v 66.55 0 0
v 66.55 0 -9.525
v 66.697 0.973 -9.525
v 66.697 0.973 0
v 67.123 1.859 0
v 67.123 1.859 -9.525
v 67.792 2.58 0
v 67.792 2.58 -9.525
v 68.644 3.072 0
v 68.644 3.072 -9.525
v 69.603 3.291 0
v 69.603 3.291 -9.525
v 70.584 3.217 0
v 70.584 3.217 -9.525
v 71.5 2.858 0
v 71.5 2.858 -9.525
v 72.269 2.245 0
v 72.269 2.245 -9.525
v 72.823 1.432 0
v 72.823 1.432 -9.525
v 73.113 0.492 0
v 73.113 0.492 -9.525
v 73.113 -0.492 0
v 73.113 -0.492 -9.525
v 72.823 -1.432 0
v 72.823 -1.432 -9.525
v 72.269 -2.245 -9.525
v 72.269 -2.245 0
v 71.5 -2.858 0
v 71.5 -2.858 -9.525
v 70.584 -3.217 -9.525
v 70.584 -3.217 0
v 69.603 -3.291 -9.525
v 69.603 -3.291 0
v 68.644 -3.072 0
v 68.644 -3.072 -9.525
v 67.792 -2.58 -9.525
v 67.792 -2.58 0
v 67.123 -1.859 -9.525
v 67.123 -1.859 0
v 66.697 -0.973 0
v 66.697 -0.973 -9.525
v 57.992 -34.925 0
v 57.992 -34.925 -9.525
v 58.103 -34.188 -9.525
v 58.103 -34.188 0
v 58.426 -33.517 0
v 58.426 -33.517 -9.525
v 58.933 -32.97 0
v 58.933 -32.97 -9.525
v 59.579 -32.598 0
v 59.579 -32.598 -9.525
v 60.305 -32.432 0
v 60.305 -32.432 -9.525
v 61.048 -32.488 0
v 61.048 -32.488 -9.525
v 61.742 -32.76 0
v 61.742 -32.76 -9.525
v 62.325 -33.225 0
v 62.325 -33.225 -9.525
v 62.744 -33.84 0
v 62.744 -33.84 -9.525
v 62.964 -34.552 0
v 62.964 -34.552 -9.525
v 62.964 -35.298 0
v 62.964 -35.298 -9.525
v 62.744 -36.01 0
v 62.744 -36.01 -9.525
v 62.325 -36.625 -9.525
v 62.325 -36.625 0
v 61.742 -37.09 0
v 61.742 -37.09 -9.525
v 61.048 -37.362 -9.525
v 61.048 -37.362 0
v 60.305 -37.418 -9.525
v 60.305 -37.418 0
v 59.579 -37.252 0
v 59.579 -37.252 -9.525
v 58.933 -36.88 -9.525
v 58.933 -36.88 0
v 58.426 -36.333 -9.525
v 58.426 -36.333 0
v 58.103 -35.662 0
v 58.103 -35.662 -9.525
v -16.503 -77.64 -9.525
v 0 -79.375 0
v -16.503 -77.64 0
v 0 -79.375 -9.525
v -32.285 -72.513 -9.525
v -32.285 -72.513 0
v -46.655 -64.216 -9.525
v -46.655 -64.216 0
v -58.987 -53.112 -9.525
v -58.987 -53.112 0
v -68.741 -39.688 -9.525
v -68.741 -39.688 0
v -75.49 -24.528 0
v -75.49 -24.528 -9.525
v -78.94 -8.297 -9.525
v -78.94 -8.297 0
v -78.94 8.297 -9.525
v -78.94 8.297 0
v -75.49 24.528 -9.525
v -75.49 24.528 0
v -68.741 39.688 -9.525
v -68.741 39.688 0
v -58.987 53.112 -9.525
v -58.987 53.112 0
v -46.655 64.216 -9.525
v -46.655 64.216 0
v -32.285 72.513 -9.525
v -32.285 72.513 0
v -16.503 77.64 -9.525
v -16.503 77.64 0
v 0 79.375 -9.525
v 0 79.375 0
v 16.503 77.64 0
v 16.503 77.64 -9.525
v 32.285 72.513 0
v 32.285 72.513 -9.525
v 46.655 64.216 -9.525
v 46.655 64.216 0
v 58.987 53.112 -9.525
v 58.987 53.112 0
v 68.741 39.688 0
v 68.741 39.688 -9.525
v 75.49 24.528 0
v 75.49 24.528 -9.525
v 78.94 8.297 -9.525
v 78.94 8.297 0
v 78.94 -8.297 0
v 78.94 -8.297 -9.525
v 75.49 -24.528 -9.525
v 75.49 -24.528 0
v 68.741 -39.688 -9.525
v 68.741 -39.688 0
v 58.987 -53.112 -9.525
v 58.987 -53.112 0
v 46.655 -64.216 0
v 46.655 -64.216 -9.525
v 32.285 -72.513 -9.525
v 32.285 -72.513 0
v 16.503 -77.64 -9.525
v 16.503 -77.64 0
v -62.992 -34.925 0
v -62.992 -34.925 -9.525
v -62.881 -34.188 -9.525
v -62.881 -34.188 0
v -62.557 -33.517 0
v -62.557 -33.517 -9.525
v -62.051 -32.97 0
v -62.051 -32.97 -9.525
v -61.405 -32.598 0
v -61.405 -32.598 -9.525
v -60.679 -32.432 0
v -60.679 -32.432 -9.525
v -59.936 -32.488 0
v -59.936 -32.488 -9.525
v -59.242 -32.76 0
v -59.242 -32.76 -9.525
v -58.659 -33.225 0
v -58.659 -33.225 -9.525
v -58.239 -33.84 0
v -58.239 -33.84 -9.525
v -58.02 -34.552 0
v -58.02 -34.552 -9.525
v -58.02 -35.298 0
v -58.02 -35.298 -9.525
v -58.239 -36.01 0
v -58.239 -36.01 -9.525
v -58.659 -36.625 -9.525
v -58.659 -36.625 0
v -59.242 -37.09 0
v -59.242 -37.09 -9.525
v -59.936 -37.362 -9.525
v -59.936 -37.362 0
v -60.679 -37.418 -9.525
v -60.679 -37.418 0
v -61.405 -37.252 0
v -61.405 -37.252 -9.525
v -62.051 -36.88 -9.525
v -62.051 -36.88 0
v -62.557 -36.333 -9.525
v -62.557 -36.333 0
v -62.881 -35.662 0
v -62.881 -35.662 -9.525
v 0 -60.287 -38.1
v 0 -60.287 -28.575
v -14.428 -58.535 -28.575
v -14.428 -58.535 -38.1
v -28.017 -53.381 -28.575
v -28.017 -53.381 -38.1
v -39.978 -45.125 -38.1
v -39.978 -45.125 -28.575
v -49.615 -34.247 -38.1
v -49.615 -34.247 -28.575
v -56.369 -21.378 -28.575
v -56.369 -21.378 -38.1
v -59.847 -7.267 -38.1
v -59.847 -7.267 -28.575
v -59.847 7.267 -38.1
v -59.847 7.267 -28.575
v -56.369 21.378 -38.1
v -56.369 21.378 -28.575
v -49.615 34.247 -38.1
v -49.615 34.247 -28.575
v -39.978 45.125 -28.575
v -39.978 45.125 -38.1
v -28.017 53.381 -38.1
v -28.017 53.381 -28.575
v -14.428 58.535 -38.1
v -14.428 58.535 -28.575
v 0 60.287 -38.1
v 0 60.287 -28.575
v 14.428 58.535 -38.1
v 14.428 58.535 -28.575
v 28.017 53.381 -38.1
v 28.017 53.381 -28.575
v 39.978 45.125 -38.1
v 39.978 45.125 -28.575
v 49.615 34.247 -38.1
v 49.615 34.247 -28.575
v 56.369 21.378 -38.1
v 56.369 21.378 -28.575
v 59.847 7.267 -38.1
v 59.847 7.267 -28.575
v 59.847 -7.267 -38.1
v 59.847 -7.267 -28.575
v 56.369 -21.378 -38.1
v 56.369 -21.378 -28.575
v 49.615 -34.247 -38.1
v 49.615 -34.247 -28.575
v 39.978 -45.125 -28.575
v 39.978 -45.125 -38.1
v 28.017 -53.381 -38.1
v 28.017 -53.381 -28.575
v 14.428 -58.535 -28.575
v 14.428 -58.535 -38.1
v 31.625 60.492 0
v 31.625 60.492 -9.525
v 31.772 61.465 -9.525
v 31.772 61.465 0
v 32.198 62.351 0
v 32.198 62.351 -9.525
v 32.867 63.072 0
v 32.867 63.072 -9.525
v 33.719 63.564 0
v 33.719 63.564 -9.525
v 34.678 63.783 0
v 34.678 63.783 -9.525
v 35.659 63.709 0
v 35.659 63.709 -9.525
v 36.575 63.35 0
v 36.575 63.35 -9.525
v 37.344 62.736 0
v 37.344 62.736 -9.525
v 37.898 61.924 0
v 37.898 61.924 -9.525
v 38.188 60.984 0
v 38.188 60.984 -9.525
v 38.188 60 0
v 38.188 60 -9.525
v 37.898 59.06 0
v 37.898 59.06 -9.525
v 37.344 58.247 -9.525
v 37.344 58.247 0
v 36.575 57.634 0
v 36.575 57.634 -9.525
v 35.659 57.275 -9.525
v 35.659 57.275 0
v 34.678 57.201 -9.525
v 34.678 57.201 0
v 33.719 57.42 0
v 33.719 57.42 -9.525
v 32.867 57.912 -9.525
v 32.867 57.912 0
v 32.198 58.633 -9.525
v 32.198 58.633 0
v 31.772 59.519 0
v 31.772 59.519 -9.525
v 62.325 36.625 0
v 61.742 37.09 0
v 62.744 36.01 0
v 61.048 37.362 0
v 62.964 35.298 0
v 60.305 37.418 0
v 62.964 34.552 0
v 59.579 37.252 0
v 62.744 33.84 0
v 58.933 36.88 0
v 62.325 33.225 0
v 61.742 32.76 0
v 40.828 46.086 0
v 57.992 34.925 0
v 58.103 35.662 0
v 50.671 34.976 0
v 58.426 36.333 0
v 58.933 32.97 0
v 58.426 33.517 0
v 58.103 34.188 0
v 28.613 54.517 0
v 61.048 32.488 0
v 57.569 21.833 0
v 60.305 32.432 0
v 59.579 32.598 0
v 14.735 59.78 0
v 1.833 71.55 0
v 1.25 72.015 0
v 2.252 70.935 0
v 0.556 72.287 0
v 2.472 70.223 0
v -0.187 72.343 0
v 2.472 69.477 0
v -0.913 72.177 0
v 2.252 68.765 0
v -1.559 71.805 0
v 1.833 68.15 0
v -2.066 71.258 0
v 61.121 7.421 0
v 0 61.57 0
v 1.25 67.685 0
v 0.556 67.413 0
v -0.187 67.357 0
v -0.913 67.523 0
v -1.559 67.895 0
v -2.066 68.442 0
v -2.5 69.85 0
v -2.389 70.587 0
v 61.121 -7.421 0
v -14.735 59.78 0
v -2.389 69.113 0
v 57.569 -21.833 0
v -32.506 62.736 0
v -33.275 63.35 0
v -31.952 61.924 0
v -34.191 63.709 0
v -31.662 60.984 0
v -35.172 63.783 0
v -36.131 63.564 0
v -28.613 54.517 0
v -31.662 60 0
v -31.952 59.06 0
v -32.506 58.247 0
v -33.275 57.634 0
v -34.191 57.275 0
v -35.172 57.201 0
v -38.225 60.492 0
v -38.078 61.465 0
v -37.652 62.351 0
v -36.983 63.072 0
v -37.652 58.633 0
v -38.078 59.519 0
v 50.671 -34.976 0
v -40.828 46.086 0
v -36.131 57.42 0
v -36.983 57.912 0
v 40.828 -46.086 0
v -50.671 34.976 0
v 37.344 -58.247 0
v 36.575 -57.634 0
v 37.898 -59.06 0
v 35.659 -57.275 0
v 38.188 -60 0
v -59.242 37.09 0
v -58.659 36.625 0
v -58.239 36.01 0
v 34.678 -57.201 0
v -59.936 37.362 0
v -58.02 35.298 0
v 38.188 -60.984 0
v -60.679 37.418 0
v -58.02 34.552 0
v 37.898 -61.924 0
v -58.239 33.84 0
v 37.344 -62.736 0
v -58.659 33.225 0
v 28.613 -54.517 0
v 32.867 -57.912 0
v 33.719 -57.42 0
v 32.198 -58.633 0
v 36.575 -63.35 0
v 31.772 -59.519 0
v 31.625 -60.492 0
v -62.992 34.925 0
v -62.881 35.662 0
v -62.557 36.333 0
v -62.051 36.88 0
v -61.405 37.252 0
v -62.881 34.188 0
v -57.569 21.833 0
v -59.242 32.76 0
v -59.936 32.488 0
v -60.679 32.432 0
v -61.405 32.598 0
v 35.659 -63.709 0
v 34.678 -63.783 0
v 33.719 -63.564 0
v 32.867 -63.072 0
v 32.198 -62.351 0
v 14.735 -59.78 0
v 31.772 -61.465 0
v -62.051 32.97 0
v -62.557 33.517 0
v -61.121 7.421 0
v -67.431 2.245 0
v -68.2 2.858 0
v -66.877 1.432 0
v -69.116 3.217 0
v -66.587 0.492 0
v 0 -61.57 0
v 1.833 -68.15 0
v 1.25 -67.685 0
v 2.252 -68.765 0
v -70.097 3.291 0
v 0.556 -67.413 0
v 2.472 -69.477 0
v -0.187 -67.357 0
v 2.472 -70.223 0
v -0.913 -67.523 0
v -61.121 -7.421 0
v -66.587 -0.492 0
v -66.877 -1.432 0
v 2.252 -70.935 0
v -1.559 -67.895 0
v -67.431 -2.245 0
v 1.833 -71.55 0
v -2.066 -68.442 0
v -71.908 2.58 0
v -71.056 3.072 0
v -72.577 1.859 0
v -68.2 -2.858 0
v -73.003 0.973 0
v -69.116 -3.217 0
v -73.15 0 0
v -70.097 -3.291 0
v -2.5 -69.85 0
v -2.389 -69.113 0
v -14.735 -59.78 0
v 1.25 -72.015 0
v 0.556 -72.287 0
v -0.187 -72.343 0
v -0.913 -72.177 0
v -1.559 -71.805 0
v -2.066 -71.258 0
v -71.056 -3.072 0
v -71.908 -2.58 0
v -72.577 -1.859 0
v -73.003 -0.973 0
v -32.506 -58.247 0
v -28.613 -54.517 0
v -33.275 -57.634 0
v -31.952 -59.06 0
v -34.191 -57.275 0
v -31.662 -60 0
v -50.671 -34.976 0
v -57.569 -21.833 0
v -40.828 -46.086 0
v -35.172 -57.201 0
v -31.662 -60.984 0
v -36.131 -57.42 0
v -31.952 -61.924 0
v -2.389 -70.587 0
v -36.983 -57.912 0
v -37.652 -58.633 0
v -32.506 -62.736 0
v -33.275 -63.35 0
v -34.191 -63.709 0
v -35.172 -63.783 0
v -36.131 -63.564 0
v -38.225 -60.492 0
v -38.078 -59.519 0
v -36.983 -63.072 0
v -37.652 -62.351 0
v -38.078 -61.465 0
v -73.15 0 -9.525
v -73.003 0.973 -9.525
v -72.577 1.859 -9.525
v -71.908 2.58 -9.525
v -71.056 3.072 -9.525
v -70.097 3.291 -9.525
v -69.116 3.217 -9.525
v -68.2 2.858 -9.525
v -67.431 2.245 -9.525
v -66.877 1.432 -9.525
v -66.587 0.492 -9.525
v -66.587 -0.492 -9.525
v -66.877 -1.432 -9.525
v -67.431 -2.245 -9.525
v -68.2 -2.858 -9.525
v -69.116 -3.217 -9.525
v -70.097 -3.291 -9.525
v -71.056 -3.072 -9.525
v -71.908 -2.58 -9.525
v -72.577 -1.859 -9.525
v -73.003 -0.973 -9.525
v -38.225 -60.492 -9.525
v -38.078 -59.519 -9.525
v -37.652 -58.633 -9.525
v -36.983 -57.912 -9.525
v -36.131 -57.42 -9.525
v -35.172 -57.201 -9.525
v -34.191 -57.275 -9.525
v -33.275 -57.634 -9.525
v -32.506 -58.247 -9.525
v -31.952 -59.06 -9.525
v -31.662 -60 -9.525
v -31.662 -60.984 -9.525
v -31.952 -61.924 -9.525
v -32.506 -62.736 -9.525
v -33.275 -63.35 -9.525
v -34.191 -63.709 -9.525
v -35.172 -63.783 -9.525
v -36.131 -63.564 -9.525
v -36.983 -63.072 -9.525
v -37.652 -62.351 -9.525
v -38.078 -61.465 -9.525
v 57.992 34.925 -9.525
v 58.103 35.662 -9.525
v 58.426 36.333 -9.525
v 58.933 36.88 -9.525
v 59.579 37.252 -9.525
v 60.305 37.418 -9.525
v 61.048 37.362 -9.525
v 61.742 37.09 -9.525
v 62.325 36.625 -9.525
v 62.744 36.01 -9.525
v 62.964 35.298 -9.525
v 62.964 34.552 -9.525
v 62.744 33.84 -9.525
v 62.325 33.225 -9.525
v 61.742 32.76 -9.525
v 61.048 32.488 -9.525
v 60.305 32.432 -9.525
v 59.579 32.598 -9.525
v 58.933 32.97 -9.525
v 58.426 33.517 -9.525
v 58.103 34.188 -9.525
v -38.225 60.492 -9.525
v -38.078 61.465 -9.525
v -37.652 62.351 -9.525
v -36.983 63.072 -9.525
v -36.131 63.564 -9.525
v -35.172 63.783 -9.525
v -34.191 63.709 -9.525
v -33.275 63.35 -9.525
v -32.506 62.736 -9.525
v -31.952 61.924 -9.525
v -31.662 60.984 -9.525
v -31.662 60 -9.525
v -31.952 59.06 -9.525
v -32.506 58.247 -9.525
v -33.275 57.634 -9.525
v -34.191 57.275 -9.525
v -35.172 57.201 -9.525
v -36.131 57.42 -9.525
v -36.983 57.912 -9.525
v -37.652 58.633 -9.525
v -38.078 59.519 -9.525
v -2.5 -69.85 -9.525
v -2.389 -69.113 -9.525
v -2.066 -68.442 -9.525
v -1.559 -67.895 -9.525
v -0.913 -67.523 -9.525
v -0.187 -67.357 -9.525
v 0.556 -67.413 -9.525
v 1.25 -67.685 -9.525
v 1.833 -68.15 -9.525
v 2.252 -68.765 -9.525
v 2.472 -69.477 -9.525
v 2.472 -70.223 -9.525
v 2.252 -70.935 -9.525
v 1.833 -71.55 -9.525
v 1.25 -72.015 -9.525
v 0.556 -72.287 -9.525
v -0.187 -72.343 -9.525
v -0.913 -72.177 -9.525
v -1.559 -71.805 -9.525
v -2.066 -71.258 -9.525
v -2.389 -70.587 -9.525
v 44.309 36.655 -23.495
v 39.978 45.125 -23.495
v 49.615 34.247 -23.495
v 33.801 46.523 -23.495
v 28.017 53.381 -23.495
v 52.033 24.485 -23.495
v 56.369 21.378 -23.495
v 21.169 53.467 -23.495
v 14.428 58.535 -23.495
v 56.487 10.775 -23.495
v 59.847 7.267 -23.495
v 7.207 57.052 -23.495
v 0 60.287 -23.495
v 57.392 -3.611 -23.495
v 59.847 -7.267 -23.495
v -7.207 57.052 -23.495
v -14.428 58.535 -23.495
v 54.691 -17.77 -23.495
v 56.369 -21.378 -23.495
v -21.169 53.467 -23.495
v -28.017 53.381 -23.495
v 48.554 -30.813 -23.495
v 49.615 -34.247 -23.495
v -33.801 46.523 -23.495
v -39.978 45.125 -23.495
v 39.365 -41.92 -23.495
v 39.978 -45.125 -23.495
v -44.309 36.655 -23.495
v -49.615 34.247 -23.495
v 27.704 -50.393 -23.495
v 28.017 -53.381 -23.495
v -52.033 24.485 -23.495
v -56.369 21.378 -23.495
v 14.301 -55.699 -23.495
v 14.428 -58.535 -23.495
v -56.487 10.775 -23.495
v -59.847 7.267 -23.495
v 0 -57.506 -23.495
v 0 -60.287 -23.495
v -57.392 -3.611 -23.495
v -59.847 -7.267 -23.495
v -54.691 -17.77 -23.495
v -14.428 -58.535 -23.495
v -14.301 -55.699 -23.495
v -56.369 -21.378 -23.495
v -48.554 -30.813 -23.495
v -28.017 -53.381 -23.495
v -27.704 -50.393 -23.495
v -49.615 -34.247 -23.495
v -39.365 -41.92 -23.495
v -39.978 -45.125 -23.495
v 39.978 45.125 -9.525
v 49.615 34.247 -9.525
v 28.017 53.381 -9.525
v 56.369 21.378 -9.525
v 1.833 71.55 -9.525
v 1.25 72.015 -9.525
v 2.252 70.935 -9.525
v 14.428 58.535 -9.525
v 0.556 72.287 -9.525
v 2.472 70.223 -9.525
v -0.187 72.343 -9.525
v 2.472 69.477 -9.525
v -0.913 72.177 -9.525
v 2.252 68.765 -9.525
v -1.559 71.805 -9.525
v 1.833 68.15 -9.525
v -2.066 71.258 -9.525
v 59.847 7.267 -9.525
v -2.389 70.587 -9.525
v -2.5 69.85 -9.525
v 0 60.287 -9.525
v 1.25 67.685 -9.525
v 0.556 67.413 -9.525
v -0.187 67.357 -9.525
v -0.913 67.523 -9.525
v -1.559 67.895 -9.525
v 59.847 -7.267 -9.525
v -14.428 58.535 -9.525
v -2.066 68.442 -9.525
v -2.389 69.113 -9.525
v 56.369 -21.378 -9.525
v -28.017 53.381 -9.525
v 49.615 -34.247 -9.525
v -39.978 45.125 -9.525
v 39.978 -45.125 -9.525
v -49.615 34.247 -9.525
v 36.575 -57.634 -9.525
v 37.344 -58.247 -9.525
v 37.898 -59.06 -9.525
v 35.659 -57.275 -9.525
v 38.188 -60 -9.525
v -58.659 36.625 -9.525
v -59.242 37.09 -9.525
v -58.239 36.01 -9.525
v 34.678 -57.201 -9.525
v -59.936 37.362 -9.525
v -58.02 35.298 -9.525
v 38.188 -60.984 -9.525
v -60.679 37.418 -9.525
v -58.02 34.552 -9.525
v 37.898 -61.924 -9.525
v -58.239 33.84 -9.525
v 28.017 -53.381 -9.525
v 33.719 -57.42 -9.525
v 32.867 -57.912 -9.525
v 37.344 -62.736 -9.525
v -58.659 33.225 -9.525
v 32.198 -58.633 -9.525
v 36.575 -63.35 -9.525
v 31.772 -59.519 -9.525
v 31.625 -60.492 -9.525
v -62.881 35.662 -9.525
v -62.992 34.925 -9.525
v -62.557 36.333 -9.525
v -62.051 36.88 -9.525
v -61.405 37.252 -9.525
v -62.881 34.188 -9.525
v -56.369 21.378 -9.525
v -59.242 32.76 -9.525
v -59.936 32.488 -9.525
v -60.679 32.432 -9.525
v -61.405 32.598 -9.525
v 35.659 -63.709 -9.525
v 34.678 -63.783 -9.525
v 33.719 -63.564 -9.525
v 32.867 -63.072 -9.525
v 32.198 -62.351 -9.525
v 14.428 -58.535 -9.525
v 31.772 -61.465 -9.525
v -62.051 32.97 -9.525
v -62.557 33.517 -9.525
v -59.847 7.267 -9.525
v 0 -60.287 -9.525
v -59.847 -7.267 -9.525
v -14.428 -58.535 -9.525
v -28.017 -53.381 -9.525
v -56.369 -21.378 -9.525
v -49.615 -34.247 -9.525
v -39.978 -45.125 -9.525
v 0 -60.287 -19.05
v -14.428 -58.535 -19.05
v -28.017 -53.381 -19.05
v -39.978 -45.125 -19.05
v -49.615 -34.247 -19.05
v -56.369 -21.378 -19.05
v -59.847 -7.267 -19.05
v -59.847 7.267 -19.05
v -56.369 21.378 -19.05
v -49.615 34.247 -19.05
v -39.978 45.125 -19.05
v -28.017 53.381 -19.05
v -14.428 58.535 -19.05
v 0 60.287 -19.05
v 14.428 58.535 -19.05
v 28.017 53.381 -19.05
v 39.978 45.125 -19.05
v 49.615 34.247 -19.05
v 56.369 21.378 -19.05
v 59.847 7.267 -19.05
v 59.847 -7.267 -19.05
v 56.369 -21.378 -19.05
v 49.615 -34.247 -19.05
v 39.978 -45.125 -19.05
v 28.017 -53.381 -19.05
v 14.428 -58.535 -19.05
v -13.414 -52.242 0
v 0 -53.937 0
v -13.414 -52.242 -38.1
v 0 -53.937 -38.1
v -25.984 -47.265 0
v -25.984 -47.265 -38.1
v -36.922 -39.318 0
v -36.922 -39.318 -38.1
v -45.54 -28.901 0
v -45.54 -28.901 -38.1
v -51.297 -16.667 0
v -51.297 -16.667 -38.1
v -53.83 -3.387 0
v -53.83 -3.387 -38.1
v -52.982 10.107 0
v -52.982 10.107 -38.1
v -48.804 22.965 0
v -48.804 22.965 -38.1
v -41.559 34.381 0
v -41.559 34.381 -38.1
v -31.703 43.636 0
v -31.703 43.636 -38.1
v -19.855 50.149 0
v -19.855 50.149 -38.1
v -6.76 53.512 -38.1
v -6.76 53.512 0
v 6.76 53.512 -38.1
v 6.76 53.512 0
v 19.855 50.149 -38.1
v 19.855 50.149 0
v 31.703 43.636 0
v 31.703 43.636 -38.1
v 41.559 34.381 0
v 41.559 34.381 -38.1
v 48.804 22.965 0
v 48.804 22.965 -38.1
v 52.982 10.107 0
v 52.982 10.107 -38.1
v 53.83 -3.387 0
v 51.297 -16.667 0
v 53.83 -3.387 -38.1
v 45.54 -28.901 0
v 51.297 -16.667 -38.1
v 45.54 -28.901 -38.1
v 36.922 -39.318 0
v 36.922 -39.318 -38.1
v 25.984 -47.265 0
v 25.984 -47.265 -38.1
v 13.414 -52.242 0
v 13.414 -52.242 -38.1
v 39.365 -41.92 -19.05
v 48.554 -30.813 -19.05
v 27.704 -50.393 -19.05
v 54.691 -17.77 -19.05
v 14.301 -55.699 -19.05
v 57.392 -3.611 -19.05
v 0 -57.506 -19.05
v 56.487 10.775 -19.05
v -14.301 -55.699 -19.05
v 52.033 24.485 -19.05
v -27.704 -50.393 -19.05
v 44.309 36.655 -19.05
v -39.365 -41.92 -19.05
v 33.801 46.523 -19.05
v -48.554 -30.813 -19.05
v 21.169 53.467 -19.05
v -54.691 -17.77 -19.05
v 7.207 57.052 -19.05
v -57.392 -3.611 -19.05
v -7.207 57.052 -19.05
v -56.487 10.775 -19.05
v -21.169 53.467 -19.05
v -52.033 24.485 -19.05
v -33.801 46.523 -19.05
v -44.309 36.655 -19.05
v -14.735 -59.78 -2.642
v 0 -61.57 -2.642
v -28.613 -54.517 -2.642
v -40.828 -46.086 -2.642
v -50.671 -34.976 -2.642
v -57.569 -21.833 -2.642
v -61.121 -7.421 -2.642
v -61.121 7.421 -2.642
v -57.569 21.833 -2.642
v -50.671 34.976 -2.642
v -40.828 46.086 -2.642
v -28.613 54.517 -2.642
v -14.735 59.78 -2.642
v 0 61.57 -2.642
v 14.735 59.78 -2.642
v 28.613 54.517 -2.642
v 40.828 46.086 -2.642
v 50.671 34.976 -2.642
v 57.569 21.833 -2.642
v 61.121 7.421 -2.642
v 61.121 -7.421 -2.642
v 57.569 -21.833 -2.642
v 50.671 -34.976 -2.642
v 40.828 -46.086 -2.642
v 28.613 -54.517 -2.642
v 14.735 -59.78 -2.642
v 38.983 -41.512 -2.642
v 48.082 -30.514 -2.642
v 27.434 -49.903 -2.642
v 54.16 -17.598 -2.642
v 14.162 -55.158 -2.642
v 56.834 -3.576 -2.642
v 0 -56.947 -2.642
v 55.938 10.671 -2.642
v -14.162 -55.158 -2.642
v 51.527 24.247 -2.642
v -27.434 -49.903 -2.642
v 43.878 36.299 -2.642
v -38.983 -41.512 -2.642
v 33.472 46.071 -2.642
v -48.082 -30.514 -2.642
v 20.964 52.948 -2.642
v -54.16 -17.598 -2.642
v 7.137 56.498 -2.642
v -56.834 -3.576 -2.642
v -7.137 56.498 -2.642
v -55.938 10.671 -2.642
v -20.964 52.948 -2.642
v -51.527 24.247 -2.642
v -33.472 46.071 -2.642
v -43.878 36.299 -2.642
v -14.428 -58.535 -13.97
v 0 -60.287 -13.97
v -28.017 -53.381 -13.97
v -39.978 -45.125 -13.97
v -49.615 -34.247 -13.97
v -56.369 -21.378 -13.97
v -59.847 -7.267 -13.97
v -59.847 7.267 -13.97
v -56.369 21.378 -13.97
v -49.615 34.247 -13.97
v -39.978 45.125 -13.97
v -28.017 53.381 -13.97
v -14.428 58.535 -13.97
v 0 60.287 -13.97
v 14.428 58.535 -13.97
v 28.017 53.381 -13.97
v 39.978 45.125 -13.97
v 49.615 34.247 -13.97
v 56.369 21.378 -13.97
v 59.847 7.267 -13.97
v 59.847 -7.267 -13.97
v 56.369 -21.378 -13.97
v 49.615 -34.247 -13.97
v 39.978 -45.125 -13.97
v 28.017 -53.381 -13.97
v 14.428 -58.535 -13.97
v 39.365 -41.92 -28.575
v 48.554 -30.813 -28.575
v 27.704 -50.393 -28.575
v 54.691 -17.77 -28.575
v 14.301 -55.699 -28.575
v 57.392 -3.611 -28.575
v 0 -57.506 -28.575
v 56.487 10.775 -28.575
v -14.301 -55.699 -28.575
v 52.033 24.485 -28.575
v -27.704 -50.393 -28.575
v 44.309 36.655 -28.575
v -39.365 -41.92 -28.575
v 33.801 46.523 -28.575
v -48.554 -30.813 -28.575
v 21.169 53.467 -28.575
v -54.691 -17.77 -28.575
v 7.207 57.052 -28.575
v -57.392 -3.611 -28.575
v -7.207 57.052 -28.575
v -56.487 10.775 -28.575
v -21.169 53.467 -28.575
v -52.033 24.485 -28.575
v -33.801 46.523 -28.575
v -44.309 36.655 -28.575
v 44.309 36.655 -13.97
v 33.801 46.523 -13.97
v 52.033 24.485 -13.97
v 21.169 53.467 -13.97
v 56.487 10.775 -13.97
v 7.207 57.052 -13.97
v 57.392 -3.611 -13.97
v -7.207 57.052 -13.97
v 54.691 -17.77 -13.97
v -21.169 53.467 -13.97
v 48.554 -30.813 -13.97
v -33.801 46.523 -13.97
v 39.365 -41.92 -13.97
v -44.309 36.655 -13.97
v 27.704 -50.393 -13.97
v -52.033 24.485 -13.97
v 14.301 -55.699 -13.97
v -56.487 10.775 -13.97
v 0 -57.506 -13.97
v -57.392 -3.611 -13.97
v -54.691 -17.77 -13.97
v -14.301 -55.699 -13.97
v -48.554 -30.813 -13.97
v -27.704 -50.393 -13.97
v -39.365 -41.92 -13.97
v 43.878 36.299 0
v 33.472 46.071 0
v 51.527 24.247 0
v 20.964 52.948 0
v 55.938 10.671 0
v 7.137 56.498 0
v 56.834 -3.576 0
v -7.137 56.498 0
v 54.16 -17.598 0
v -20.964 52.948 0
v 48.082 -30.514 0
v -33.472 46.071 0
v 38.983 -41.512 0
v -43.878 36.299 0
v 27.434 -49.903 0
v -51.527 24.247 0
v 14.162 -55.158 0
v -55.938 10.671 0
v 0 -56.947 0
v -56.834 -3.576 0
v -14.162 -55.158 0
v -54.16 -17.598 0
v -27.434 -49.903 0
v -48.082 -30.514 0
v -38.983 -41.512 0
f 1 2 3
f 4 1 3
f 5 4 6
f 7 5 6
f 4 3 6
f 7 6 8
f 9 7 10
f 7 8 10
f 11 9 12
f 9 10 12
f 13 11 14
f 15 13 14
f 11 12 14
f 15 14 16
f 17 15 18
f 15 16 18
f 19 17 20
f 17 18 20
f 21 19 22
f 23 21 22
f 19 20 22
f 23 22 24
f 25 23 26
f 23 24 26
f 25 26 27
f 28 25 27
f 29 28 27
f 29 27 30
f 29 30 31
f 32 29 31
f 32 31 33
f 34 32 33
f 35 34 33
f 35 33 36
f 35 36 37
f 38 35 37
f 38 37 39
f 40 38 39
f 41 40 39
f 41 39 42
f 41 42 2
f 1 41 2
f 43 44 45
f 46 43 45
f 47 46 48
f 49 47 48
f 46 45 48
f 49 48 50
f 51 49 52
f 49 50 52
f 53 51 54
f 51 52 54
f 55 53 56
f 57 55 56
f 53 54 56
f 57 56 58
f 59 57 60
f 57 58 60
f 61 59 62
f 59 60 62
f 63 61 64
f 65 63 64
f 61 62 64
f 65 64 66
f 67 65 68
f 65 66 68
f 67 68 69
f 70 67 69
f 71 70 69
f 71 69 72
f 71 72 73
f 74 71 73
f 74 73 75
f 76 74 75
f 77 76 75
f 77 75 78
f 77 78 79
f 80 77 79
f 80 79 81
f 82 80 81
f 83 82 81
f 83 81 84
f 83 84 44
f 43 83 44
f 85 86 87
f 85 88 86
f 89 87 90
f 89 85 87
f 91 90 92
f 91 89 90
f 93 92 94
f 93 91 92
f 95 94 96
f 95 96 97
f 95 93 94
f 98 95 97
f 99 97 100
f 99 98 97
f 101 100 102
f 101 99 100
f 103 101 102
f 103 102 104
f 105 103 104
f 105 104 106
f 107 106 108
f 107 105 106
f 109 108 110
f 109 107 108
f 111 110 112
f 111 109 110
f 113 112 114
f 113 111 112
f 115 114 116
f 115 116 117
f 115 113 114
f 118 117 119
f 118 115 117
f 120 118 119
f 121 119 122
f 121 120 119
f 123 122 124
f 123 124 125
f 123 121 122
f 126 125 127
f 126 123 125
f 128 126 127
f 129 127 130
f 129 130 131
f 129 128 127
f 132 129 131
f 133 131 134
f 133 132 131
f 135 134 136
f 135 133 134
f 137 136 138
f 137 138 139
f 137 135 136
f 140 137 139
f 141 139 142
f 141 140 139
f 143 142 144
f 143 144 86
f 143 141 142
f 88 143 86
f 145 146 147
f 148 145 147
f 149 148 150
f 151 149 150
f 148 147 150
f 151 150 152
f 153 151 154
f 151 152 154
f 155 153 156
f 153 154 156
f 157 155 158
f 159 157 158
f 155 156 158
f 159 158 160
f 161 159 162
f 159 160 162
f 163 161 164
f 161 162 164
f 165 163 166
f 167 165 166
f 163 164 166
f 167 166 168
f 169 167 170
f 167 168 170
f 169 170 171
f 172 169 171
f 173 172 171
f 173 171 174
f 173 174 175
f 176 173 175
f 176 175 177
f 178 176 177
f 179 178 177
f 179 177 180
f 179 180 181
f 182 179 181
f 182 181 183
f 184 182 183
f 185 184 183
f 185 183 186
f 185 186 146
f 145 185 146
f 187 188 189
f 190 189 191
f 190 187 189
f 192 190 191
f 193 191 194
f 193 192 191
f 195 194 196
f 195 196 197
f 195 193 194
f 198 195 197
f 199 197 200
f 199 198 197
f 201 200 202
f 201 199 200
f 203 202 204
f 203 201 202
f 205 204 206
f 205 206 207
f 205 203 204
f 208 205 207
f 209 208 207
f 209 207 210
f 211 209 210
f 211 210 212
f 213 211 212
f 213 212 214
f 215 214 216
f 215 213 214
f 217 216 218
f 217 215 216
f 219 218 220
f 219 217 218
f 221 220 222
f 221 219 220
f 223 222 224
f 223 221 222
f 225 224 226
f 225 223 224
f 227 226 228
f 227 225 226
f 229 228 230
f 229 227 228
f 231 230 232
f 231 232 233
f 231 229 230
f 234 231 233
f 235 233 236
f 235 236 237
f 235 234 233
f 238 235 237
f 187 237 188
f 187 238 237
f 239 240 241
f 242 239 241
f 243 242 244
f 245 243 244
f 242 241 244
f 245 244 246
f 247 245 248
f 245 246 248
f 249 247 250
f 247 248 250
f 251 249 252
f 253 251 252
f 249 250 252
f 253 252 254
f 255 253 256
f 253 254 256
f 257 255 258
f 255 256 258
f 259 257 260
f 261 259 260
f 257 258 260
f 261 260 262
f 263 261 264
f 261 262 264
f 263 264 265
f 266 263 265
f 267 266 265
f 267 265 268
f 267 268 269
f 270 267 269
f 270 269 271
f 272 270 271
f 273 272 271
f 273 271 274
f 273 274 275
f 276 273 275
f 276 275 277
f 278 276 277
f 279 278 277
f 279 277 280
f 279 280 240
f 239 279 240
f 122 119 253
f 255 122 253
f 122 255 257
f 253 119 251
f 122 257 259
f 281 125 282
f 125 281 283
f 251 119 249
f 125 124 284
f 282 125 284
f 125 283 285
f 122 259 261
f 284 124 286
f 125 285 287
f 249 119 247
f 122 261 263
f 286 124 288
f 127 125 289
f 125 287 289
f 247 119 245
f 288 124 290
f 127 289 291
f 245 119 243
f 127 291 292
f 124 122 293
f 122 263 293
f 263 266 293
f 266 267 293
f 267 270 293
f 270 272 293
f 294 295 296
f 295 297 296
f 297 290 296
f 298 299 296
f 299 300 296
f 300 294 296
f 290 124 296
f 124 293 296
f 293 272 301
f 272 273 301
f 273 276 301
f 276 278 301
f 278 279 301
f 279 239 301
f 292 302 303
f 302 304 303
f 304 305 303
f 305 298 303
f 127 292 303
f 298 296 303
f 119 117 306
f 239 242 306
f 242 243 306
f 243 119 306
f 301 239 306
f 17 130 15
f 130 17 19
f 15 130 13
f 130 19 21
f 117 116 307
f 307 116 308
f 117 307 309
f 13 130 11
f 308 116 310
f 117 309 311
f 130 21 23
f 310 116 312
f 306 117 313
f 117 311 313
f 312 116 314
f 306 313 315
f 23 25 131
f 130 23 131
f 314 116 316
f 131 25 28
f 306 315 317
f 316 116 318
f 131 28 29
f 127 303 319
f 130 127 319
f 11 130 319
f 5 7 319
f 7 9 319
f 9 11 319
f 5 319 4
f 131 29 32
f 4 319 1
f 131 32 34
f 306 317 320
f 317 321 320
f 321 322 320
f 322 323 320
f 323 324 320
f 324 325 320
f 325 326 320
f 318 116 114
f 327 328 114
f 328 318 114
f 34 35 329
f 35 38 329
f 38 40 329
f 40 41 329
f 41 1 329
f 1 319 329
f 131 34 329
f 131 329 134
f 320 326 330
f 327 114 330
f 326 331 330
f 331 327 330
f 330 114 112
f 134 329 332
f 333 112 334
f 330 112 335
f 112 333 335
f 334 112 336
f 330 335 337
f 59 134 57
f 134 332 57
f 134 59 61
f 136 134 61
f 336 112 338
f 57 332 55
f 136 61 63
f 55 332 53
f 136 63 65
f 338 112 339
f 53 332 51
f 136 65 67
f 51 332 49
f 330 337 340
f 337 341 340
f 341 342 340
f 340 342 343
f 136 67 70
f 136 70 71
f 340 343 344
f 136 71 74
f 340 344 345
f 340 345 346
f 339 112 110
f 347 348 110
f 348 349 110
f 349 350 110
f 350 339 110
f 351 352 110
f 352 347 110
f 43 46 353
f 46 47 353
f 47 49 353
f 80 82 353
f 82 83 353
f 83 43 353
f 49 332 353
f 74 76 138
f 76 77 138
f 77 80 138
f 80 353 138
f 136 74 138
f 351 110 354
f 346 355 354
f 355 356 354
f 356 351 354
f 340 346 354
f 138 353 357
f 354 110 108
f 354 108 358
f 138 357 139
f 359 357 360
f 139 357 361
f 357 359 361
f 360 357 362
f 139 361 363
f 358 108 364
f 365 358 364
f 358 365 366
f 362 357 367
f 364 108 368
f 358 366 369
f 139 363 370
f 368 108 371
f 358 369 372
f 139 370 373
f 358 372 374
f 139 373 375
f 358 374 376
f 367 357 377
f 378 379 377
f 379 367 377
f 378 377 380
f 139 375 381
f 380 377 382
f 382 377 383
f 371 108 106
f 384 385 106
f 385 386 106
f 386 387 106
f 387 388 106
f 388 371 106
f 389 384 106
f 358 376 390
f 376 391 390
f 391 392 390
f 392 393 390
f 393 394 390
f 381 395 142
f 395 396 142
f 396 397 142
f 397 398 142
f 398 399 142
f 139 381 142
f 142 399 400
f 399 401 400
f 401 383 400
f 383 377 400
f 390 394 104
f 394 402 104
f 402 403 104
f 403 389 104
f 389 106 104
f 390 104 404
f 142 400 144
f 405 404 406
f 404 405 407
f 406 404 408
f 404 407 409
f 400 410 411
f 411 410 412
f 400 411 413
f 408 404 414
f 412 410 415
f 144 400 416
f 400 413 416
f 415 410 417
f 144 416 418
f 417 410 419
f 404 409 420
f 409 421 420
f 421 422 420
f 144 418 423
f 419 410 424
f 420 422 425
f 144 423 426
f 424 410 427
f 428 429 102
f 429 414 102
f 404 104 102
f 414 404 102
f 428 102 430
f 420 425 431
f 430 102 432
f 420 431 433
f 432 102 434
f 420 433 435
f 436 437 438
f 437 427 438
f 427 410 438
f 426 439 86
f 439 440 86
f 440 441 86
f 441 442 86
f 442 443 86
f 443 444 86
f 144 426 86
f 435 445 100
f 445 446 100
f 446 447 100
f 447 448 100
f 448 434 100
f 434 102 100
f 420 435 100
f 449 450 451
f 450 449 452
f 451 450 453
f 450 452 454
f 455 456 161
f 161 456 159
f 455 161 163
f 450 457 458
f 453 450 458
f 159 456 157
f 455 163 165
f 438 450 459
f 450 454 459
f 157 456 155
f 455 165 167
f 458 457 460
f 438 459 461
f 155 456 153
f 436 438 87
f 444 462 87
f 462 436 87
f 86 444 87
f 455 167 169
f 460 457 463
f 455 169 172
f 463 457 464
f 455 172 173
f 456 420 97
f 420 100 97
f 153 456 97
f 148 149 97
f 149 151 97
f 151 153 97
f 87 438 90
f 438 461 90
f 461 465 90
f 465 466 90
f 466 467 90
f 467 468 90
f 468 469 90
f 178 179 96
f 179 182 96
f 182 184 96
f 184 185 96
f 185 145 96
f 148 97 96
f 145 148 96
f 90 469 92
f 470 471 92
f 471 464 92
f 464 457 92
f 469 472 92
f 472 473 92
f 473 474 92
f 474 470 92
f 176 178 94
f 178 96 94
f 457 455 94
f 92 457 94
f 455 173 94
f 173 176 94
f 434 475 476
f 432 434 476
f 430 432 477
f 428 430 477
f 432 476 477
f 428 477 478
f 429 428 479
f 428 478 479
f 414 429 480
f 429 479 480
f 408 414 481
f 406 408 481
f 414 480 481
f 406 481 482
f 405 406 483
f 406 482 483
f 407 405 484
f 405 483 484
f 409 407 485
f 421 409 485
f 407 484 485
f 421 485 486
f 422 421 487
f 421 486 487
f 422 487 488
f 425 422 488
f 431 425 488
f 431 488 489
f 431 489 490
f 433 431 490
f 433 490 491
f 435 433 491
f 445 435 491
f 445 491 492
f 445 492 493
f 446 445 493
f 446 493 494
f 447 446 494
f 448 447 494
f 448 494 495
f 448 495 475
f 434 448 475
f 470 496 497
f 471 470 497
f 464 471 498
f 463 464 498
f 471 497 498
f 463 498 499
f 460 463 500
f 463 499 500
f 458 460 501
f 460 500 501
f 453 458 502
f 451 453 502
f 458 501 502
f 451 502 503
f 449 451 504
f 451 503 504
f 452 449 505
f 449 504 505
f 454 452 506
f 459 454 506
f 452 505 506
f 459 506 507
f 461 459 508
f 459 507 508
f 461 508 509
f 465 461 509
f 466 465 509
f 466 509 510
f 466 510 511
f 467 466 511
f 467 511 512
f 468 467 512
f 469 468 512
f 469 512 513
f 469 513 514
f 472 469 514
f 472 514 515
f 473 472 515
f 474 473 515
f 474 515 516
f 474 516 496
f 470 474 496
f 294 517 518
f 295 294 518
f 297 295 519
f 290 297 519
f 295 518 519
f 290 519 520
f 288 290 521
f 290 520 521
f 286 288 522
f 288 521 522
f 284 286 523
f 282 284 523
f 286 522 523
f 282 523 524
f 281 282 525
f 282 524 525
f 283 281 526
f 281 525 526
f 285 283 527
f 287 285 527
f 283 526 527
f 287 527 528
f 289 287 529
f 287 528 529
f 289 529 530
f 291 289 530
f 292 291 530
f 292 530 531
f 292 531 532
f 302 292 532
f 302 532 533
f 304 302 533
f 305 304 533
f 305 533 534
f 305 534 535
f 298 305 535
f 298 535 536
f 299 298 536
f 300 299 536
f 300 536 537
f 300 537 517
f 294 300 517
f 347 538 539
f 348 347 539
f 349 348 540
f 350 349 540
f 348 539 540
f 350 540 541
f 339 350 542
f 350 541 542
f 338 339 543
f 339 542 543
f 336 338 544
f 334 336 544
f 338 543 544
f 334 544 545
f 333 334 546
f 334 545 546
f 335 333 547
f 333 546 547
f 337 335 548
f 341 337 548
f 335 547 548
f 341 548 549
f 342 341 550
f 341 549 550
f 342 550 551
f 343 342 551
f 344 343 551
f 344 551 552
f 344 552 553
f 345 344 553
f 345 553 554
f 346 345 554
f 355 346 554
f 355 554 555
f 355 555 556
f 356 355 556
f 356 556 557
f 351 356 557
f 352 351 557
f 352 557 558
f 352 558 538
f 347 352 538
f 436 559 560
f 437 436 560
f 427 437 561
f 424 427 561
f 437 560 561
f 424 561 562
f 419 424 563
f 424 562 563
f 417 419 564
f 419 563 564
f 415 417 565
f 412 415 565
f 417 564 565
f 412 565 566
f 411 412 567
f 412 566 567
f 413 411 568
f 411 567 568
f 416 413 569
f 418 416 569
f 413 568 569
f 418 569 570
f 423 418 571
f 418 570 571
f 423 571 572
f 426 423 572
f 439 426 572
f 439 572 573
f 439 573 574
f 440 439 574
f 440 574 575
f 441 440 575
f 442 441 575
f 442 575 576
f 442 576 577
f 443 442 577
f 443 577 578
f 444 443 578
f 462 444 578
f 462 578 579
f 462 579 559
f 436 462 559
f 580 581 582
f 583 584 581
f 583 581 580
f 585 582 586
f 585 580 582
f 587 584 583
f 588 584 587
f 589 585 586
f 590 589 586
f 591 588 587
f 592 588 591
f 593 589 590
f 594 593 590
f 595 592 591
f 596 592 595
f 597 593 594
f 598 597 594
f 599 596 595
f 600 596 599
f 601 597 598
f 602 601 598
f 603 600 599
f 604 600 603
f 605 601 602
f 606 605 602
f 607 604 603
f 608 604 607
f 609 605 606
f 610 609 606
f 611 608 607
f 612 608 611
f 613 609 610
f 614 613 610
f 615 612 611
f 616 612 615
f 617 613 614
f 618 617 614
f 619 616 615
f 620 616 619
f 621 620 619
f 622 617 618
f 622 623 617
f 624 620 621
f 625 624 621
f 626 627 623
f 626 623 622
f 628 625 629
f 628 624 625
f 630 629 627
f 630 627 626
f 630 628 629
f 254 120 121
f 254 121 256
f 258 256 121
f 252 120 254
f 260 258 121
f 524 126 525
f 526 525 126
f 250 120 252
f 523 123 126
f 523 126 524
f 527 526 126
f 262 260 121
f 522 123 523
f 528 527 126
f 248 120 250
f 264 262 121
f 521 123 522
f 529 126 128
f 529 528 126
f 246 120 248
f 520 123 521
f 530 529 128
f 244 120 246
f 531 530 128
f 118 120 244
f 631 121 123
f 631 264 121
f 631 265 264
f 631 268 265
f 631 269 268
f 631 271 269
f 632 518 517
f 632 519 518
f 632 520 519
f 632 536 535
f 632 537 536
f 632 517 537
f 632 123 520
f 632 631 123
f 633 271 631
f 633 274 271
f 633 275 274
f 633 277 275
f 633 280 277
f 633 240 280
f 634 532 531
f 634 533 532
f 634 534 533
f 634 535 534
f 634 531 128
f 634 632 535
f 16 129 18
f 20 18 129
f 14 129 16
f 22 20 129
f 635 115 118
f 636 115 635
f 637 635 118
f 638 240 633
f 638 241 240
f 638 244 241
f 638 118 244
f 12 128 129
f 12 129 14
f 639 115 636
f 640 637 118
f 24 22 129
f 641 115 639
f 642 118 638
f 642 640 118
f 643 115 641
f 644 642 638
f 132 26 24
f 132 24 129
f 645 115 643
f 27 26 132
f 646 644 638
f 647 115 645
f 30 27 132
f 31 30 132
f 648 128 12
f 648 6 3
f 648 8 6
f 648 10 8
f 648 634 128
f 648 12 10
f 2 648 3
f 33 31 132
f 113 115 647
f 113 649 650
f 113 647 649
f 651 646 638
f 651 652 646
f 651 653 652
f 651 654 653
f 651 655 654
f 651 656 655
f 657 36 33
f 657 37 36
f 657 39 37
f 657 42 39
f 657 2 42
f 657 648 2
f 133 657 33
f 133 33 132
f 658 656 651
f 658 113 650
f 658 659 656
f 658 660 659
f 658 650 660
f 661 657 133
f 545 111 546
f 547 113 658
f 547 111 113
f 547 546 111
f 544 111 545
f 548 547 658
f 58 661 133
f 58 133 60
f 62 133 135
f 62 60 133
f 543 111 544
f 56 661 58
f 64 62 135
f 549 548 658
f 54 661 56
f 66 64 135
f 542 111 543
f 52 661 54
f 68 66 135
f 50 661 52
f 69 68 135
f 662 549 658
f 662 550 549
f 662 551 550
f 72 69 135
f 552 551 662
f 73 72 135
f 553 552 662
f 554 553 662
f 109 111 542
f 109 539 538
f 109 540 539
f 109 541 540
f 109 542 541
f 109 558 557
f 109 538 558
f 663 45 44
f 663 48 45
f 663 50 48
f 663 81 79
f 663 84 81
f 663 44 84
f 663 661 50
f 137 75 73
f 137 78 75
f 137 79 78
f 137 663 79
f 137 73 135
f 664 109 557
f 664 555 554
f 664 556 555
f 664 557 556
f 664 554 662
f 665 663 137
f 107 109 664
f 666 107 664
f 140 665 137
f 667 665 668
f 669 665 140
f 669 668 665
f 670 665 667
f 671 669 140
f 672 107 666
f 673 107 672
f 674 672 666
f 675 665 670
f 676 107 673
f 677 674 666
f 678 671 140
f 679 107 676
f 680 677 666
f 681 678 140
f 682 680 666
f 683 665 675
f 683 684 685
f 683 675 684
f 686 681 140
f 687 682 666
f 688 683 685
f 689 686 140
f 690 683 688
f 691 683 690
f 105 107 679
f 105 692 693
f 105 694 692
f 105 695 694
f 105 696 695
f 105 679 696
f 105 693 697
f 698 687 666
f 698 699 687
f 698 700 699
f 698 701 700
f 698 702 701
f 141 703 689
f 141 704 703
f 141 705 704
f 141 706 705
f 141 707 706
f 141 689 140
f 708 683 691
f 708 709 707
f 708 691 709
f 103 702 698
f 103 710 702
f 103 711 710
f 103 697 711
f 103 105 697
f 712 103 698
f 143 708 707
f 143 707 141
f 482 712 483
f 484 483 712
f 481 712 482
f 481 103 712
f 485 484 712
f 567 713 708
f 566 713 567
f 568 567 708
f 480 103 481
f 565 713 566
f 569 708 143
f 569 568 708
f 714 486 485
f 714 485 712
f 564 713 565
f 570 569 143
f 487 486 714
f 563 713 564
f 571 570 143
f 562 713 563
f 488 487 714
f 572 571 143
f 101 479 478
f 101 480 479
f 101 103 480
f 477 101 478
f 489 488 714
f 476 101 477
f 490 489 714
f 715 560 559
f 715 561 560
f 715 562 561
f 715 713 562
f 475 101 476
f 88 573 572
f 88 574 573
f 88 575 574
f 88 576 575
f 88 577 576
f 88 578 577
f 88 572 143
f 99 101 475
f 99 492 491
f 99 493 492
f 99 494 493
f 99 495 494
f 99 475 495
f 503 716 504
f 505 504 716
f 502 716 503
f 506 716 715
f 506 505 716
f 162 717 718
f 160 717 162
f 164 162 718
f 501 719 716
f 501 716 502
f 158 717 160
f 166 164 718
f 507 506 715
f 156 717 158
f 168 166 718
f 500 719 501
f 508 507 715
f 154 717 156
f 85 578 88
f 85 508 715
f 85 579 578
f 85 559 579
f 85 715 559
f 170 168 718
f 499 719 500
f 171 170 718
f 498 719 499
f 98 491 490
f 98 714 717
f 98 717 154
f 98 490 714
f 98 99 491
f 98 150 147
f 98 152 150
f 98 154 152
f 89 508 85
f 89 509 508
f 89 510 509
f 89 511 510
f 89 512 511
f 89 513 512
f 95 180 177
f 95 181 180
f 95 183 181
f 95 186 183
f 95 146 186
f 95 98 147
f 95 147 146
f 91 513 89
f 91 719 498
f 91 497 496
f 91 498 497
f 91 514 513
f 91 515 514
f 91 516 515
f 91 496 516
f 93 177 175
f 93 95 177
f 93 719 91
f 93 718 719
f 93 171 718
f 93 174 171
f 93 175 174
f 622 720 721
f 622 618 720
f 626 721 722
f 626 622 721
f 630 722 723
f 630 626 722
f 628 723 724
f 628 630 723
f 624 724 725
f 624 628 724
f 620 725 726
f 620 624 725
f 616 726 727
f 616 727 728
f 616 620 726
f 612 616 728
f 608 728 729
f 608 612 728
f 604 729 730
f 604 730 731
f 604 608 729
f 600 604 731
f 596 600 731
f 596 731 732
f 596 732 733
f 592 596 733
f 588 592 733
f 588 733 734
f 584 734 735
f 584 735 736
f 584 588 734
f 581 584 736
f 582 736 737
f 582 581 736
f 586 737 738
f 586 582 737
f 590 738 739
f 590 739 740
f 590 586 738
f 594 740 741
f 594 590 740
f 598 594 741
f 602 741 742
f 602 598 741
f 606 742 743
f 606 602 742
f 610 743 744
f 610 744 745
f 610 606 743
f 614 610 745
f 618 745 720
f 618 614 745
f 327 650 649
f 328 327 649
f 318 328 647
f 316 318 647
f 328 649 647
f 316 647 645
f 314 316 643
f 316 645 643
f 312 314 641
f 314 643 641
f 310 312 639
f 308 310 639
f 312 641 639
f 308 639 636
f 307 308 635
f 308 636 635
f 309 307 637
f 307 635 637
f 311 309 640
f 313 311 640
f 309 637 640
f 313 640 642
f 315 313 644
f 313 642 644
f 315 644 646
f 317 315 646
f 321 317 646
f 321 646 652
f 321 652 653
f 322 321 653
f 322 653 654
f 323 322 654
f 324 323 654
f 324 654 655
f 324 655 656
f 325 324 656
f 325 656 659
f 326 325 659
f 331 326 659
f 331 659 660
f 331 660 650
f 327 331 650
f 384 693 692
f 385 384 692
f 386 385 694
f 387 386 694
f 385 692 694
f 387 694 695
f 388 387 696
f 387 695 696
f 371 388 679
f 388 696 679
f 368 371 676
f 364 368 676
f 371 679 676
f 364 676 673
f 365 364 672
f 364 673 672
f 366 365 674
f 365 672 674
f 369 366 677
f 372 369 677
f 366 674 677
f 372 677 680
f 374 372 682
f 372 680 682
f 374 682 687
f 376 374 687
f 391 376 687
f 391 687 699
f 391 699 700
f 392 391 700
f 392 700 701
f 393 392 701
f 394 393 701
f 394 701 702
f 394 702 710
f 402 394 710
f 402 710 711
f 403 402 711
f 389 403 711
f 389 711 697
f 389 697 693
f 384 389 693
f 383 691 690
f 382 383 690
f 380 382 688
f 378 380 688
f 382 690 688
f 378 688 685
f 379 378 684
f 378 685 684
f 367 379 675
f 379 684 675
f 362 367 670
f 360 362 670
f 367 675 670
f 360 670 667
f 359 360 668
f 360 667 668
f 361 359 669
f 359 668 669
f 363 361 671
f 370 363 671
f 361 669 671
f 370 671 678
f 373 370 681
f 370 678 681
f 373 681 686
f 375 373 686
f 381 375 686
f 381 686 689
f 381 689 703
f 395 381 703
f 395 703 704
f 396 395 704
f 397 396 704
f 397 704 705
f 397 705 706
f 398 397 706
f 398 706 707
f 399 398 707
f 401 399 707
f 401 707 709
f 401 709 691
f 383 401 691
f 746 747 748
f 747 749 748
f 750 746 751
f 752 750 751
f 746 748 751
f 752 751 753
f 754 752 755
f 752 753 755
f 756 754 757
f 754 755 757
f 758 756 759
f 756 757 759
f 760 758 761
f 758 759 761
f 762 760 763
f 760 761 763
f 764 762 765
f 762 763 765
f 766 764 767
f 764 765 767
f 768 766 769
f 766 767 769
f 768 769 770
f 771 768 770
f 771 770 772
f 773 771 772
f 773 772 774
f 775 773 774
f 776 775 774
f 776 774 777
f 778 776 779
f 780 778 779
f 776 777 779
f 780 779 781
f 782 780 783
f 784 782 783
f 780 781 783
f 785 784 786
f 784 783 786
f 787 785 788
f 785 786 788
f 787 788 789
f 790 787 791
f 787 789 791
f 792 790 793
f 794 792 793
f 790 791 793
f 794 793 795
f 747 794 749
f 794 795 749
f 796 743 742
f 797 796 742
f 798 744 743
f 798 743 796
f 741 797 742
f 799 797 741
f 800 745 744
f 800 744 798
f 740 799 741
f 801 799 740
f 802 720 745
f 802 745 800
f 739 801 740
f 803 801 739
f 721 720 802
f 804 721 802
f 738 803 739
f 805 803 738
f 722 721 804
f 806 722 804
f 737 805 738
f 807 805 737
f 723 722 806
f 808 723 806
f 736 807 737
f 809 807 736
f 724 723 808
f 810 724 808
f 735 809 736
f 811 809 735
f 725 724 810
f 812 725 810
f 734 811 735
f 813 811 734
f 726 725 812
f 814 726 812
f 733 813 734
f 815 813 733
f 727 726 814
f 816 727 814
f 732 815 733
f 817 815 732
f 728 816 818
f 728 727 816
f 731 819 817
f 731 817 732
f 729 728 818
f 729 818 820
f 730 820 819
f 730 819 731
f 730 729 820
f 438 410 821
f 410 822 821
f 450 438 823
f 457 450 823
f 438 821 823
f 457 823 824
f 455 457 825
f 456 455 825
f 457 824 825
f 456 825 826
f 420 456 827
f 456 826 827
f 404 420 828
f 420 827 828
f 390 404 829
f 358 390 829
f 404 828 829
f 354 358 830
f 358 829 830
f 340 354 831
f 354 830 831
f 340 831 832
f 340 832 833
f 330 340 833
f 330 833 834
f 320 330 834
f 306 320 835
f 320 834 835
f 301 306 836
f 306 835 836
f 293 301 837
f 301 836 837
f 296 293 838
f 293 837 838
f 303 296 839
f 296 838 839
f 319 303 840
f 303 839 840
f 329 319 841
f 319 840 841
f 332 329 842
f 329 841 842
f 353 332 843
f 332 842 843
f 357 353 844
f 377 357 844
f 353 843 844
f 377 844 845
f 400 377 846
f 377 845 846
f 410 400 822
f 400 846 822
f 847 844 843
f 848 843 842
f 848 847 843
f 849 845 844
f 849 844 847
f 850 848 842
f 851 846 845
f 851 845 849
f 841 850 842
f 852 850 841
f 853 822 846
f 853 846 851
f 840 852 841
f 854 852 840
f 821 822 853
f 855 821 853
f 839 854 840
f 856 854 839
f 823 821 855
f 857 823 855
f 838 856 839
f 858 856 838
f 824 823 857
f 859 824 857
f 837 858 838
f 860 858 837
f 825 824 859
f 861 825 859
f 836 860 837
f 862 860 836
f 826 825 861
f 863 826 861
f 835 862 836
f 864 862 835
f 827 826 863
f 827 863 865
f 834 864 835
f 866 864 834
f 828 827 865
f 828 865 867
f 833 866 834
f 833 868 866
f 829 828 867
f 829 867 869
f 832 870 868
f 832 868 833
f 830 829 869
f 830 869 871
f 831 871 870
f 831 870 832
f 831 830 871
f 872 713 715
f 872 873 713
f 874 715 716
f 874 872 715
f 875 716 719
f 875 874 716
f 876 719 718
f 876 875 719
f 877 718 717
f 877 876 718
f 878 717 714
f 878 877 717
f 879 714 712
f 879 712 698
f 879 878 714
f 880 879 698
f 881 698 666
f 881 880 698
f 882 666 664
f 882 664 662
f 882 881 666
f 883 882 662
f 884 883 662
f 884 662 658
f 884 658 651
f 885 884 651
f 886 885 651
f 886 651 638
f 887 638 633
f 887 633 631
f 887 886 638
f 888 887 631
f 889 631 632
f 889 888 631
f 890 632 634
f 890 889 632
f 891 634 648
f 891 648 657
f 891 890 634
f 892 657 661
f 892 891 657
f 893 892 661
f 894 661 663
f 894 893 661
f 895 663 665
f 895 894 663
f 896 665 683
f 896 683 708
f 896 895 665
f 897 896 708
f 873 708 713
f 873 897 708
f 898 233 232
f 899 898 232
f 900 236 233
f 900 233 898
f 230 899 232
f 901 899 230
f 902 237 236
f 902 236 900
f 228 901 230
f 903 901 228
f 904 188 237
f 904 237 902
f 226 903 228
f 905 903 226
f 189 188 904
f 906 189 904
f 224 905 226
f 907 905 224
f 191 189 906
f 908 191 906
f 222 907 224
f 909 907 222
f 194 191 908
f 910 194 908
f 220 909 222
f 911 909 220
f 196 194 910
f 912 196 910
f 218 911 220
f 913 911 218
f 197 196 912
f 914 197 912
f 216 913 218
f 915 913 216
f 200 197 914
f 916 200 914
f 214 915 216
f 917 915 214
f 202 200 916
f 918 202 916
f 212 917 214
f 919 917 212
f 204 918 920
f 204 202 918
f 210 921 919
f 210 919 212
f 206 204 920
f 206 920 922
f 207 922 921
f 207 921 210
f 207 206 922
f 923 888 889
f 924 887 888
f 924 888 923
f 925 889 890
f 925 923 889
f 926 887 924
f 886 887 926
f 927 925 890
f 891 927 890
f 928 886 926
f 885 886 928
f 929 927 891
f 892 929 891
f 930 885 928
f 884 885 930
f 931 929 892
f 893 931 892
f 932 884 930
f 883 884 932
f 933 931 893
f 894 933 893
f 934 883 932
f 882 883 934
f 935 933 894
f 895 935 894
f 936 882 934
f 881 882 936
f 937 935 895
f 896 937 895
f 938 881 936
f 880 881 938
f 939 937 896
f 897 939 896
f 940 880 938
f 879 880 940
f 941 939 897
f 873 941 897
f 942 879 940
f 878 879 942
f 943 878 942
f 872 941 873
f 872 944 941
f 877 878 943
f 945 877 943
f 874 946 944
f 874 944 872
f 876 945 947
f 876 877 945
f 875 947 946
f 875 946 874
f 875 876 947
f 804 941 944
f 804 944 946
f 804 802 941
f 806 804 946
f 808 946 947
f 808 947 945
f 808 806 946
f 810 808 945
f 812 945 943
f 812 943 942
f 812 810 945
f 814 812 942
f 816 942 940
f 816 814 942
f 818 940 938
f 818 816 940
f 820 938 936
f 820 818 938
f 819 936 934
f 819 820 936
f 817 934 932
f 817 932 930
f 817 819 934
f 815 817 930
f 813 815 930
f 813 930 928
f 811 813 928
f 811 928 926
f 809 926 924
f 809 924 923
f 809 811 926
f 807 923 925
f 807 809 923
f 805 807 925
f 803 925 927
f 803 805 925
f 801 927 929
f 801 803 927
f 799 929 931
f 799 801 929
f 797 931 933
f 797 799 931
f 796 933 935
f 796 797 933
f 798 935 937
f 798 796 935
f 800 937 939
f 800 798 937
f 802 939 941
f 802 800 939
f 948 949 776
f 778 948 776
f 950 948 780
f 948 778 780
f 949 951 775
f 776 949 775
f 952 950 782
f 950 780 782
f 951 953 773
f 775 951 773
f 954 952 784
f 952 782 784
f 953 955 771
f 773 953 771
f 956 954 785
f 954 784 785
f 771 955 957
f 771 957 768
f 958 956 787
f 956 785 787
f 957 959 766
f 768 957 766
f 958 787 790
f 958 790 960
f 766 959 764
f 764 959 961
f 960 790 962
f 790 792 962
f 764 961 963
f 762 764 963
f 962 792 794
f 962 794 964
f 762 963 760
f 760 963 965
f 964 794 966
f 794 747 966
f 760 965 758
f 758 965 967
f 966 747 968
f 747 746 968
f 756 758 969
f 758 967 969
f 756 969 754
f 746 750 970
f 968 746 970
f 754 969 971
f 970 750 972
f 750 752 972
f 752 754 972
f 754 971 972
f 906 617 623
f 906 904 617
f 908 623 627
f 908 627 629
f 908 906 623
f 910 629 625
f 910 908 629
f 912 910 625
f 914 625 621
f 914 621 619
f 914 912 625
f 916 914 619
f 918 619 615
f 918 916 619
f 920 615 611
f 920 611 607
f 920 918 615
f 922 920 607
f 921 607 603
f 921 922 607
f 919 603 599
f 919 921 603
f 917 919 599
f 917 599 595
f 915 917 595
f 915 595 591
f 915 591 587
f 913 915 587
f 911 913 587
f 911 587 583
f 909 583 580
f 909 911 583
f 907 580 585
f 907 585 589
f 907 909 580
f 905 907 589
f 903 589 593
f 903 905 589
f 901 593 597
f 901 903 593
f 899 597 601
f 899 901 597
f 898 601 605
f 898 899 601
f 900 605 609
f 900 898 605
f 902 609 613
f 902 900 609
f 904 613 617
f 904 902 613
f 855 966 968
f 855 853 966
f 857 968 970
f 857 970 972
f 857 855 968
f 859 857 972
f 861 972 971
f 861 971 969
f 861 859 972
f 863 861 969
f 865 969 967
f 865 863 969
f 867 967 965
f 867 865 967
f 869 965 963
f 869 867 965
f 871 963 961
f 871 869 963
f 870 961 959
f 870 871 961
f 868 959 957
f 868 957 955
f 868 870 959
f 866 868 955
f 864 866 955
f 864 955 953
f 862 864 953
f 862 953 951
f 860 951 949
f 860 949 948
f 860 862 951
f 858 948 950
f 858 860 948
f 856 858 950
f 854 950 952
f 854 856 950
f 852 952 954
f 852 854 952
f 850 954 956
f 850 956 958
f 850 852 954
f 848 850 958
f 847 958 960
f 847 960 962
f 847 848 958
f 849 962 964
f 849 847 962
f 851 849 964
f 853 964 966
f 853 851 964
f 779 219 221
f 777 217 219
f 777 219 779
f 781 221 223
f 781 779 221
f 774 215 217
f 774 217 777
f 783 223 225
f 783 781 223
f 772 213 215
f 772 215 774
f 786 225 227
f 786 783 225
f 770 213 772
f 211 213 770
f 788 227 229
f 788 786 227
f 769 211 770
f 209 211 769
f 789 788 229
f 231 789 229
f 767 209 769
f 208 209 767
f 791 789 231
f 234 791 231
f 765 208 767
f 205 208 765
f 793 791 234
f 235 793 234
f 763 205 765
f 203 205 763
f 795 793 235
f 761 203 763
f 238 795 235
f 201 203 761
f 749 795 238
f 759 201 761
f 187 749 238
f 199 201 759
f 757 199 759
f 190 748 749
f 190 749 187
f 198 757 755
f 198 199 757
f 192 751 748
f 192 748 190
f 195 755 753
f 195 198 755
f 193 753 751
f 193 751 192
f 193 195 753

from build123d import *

# Parameters (mm, degrees)
SKETCH1_W            = 2.6416
SKETCH1_H            = 4.6228
SKETCH1_W_2          = 9.525
SKETCH1_H_2          = 53.9369
SKETCH1_4_W          = 9.525
SKETCH1_4_H          = 53.9369
SKETCH1_4_W_2        = 2.6416
SKETCH1_4_H_2        = 4.6228
M6_TAPPED_HOLE1_D    = 5
M6_CLEARANCE_HOLE1_D = 6.6


with BuildPart() as part:
    # Sketch1 → Revolve1 (revolve)
    with BuildSketch(Plane(origin=(0, 0, 0), x_dir=(0, 0, -1), z_dir=(1, 0, 0)), mode=Mode.PRIVATE) as revolve1_sk:
        Polygon((0, 61.5696), (0, 79.375), (9.525, 79.375), (9.525, 60.2869), (13.97, 60.2869), (13.97, 57.5056), (19.05, 57.5056), (19.05, 60.2869), (23.495, 60.2869), (23.495, 57.5056), (28.575, 57.5056), (28.575, 60.2869), (38.1, 60.2869), (38.1, 53.9369), (9.525, 53.9369), (0, 53.9369), (0, 56.9468), (2.6416, 56.9468), (2.6416, 61.5696), align=None)
        with Locations((1.3208, 59.2582)):
            Rectangle(SKETCH1_W, SKETCH1_H)
        with Locations((4.7625, 26.96845)):
            Rectangle(SKETCH1_W_2, SKETCH1_H_2)
    revolve(revolve1_sk.sketch.rotate(Axis((0, 0, 0), (0, 0, -1)), 180), axis=Axis((0, 0, 0), (0, 0, -1)))

    # Sketch1<4> → Cut-Revolve1 (revolve, cut)
    with BuildSketch(Plane(origin=(0, 0, 0), x_dir=(0, 0, -1), z_dir=(1, 0, 0)), mode=Mode.PRIVATE) as cut_revolve1_sk:
        with Locations((4.7625, 26.96845)):
            Rectangle(SKETCH1_4_W, SKETCH1_4_H)
        with Locations((1.3208, 59.2582)):
            Rectangle(SKETCH1_4_W_2, SKETCH1_4_H_2)
    revolve(cut_revolve1_sk.sketch.rotate(Axis((0, 0, 0), (0, 0, -1)), 180), axis=Axis((0, 0, 0), (0, 0, -1)), mode=Mode.SUBTRACT)

    # M6 Tapped Hole1 (through all)
    with Locations(Plane.XY):
        with Locations((-60.491874454, 34.925), (0, 69.85), (60.491874454, 34.925), (60.491874454, -34.925), (0, -69.85), (-60.491874454, -34.925)):
            Hole(M6_TAPPED_HOLE1_D / 2)

    # M6 Clearance Hole1 (through all)
    with Locations(Plane.XY):
        with Locations((-69.85, 0), (0, 0), (-34.925, 60.491874454), (34.925, 60.491874454), (69.85, 0), (34.925, -60.491874454), (-34.925, -60.491874454)):
            Hole(M6_CLEARANCE_HOLE1_D / 2)


solid = part.part
